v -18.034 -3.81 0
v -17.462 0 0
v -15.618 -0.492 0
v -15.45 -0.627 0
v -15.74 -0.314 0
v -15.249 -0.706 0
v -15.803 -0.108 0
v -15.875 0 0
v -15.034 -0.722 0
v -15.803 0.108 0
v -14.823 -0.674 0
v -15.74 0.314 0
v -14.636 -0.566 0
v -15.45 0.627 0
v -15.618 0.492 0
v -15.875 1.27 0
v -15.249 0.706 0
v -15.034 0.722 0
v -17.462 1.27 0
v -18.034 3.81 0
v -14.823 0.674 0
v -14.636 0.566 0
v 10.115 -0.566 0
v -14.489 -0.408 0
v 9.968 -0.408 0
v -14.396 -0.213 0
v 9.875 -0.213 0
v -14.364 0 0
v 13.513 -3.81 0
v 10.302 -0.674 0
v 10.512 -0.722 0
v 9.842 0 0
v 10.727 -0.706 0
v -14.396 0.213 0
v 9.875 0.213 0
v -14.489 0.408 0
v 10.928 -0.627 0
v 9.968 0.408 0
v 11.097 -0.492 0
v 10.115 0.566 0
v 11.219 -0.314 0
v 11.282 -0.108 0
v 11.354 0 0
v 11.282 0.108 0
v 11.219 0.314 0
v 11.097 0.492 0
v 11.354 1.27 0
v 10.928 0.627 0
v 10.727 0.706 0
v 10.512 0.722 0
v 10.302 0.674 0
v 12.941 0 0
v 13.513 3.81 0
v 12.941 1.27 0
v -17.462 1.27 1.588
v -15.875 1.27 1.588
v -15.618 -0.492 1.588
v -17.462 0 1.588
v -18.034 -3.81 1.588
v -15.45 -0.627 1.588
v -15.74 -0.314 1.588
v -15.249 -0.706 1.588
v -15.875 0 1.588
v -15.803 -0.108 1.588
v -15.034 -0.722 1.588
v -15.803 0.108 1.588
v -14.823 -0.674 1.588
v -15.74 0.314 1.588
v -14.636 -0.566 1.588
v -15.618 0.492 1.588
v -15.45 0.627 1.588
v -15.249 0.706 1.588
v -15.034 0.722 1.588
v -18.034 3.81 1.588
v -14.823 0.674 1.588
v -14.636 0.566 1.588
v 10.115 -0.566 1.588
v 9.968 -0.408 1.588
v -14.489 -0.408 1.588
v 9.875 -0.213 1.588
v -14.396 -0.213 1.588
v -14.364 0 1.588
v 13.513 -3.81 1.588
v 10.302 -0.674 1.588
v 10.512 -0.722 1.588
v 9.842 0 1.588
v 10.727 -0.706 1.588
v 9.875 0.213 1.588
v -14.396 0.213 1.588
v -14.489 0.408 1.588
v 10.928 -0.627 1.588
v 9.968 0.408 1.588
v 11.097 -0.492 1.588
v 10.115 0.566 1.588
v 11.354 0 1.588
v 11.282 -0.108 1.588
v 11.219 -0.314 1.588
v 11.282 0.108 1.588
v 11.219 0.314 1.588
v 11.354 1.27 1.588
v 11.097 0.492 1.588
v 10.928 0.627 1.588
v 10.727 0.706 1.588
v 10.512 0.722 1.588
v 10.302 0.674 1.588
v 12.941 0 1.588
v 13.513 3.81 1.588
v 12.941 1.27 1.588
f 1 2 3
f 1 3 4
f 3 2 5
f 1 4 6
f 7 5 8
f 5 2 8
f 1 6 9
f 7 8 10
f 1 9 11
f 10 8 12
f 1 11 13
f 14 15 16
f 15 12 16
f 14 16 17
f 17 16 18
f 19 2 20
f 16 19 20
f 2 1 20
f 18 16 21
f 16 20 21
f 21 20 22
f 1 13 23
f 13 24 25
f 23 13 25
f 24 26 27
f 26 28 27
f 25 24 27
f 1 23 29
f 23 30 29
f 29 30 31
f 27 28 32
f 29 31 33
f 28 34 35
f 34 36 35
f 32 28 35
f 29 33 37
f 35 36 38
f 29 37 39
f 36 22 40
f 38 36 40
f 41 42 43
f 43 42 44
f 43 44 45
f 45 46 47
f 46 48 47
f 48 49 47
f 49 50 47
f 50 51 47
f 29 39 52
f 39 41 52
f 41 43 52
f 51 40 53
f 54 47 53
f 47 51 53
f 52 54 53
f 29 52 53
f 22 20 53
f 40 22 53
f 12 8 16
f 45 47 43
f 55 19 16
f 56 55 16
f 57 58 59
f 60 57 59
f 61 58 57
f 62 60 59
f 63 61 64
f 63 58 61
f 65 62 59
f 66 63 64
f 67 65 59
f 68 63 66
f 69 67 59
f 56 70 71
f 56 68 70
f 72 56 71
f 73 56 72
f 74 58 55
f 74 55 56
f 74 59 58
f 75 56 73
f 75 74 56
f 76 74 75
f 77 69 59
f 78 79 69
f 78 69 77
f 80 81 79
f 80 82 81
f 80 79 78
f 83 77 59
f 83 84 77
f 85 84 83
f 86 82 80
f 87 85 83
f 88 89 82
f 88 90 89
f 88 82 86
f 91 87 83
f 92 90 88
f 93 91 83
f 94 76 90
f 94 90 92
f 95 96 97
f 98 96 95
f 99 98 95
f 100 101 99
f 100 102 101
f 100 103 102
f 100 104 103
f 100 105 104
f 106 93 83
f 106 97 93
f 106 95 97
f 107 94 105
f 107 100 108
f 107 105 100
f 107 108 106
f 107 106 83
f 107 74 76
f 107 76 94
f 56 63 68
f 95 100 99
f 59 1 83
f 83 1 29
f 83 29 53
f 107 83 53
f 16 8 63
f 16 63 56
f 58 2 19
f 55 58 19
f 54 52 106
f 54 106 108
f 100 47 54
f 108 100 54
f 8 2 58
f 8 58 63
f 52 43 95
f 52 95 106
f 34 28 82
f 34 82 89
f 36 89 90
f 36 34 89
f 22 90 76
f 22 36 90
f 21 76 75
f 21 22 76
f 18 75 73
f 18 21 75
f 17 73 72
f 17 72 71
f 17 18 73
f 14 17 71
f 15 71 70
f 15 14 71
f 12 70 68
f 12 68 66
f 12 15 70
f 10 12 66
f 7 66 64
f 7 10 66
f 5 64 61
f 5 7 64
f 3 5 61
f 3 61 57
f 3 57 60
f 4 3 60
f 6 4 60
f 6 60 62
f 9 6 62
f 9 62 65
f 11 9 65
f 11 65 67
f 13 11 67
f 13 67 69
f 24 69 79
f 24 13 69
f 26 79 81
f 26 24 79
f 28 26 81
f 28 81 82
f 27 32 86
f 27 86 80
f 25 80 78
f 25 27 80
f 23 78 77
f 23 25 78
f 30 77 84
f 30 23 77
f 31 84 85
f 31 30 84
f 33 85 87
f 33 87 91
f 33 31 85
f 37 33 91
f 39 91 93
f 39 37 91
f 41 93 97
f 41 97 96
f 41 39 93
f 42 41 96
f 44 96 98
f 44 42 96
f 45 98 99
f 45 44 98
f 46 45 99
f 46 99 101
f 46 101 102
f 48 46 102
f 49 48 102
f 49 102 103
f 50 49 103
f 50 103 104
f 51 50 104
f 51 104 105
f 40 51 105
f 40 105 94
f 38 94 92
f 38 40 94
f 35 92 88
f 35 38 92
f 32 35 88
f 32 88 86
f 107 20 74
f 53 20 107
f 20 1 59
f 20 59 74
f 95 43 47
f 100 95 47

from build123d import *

# Parameters (mm, degrees)
SKETCH1_W           = 31.5468
SKETCH1_H           = 7.62
SKETCH1_R           = 0.7239
SKETCH1_W_2         = 1.5875
SKETCH1_H_2         = 1.27
BOSS_EXTRUDE1_DEPTH = 1.5875


with BuildPart() as part:
    # Sketch1 → Boss-Extrude1 (new body)
    with BuildSketch(Plane.XY):
        with Locations((-2.2606, 0)):
            Rectangle(SKETCH1_W, SKETCH1_H)
        with Locations((-15.0876, 0)):
            Circle(SKETCH1_R, mode=Mode.SUBTRACT)
        with Locations(Location((10.5664, 0, 0), (0, 0, 180))):
            Circle(SKETCH1_R, mode=Mode.SUBTRACT)
        with Locations((-16.66875, 0.635)):
            Rectangle(SKETCH1_W_2, SKETCH1_H_2, mode=Mode.SUBTRACT)
        with Locations((12.14755, 0.635)):
            Rectangle(SKETCH1_W_2, SKETCH1_H_2, mode=Mode.SUBTRACT)
    extrude(amount=BOSS_EXTRUDE1_DEPTH)


solid = part.part
